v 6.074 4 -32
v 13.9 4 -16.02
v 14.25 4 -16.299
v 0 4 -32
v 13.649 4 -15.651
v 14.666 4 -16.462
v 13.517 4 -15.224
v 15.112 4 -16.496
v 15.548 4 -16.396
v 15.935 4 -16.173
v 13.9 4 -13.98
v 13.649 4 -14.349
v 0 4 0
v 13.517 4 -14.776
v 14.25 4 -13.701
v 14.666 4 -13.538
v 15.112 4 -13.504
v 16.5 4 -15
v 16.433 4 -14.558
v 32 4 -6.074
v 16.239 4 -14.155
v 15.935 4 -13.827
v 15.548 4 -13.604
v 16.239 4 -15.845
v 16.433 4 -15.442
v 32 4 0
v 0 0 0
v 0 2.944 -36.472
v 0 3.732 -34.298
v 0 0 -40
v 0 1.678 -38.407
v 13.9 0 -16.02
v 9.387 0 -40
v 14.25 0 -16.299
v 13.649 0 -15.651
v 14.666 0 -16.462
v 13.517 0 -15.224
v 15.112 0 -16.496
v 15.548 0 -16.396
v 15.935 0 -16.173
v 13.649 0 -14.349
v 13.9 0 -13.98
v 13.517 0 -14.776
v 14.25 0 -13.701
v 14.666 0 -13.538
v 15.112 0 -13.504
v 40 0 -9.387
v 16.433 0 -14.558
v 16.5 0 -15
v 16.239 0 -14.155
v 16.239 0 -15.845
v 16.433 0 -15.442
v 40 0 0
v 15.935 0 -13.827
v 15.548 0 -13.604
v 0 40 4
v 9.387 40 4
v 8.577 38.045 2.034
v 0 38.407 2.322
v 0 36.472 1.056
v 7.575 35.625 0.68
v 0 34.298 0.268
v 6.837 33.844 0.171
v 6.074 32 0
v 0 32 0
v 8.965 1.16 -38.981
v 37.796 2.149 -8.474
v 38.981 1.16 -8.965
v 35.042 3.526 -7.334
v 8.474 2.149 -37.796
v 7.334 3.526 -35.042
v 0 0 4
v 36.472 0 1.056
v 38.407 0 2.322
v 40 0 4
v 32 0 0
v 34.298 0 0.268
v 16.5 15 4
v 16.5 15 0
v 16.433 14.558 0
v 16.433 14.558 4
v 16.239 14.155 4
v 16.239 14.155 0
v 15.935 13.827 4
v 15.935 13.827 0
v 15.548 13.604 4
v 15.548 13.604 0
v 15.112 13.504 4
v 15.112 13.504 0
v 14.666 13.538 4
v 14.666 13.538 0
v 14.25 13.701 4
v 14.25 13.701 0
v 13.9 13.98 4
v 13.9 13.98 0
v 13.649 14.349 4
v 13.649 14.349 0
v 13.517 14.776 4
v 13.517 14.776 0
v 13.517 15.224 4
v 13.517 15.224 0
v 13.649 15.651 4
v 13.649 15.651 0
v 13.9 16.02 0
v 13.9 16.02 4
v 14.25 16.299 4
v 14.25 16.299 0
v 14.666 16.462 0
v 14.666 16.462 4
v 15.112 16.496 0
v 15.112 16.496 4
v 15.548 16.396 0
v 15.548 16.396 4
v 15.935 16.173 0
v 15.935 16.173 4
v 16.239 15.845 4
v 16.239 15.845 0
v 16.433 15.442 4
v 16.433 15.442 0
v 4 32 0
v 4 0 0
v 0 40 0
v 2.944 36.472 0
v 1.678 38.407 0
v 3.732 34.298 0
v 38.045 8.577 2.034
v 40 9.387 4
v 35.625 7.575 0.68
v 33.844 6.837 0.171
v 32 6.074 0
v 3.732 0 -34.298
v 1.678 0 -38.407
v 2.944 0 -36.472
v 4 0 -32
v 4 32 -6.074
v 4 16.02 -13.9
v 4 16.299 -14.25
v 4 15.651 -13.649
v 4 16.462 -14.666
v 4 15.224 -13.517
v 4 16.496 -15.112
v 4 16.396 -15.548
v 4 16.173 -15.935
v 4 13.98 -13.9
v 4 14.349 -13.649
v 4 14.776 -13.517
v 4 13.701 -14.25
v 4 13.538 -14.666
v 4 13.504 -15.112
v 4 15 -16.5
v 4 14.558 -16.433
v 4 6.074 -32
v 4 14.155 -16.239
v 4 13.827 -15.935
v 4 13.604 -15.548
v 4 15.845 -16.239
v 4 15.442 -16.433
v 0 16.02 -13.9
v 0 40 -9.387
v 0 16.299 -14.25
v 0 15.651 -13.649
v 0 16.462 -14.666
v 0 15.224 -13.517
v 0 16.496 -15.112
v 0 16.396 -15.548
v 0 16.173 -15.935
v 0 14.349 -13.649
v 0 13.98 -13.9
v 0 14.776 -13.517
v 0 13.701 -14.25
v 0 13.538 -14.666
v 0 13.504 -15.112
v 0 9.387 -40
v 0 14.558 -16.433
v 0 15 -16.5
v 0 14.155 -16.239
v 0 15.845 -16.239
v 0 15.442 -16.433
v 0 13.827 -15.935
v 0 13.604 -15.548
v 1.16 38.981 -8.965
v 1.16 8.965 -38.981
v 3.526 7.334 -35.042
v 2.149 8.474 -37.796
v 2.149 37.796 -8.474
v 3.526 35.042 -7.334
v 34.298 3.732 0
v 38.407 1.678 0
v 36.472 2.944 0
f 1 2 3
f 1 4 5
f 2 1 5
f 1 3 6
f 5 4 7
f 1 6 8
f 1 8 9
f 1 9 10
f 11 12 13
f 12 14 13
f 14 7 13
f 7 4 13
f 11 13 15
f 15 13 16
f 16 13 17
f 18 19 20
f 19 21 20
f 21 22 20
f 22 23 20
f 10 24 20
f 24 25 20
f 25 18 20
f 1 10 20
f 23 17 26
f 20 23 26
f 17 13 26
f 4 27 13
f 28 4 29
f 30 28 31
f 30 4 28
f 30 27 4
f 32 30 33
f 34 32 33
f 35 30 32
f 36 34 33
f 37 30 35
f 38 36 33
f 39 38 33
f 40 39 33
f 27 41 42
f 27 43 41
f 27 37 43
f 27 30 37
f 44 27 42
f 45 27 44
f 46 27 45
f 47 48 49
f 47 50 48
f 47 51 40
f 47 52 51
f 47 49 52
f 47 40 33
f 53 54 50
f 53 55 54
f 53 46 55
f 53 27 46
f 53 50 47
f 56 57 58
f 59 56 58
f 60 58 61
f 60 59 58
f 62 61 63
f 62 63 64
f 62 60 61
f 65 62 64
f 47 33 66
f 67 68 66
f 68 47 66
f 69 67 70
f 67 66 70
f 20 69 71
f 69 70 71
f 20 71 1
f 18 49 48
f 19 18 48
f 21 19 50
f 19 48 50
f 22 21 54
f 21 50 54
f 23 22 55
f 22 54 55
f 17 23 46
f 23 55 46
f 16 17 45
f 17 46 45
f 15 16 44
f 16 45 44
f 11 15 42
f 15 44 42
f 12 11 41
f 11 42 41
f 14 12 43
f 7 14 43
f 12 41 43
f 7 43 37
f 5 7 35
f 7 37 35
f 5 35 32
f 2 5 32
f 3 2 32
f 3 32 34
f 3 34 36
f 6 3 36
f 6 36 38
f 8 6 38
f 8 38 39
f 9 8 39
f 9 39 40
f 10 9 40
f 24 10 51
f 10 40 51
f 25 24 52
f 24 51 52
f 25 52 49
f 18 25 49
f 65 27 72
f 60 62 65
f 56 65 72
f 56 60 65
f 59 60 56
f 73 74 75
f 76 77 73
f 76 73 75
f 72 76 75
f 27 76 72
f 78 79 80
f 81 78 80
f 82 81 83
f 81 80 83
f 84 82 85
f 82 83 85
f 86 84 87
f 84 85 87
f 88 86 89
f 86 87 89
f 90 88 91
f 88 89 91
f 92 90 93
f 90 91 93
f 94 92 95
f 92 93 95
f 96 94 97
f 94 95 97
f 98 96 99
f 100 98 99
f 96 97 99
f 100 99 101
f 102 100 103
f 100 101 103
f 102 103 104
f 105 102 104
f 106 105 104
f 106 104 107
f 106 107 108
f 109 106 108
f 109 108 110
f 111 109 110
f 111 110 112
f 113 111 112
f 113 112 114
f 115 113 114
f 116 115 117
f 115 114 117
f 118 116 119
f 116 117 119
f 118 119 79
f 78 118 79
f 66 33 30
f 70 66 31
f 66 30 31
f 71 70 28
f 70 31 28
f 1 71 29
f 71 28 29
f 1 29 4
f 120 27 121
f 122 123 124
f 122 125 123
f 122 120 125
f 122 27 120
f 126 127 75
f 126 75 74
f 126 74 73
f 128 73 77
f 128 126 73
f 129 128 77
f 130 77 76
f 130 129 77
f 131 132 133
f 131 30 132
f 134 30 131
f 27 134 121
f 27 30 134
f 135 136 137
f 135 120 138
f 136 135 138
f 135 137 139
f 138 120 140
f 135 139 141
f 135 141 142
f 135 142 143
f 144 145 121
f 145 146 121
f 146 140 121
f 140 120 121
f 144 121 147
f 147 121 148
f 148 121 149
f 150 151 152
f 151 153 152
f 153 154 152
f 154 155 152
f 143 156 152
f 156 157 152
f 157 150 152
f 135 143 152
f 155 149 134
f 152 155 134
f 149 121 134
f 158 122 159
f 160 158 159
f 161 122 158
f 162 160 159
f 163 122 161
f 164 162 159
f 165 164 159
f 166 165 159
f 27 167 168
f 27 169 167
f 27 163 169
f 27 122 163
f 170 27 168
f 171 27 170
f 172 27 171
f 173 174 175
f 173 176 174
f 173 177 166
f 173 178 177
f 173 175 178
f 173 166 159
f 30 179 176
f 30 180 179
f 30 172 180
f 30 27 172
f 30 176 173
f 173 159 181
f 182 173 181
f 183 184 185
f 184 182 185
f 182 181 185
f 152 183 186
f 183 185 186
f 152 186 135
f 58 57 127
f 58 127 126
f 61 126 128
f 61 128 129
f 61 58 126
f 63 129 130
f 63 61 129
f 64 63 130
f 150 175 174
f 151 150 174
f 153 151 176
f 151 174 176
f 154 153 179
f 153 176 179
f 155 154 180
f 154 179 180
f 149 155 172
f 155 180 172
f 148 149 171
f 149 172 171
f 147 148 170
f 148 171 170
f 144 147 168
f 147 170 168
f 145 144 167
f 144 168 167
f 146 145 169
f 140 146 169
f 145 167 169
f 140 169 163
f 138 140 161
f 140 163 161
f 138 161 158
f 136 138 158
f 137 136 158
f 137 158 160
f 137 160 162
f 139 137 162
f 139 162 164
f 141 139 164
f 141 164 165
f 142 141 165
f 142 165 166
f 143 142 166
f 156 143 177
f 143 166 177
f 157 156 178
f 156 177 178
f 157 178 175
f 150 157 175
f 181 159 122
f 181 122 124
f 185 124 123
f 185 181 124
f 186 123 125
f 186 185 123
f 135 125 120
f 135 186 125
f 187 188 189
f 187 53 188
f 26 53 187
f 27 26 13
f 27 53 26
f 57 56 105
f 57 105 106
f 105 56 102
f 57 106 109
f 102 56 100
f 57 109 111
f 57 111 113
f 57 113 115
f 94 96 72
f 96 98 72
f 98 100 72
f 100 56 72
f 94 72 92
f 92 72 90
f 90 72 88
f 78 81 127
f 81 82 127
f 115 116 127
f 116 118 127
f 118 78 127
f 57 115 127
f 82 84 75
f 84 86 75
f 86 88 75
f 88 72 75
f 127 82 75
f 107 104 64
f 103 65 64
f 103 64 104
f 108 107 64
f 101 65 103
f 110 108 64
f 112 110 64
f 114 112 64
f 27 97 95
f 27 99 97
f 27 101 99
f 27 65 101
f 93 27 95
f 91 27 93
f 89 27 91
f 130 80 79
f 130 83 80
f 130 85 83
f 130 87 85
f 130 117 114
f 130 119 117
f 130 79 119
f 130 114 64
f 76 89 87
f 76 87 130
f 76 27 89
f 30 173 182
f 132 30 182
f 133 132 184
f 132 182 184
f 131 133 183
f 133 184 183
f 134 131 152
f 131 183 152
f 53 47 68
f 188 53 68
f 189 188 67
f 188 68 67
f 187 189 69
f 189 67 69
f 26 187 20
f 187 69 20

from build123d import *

# Parameters (mm, degrees)
F0_R          = 1.5
F1_DEPTH      = 4
F2_ANGLE      = 90
F3_ANGLE      = 90
F4_T1_DEPTH   = 83.2928317533
F4_T3_DEPTH   = 49.3873450905
F4_T5_DEPTH   = 49.3873450905
F4_2_T1_DEPTH = 83.2928317533
F4_2_T3_DEPTH = 49.3873450905
F4_2_T5_DEPTH = 49.3873450905
F4_3_T1_DEPTH = 83.2928317533
F4_3_T3_DEPTH = 49.3873450905
F4_3_T5_DEPTH = 49.3873450905


# Not quite as in the source:
# - a fillet or chamfer that OpenCascade refuses, or shapes differently, is made with other operations: its cross-section is extruded or revolved along the edge and cut away or added


with BuildPart() as f1:
    # F0 (on Front) → F1 (new body)
    with BuildSketch(Plane.XZ):
        Polygon((40, 0), (0, 0), (0, -40), (9.3873450905, -40), (40, -9.3873450905), align=None)
        with Locations((15, -15)):
            Circle(F0_R, mode=Mode.SUBTRACT)
    extrude(amount=-F1_DEPTH)


with BuildPart() as f2_1:
    # F2: copy of F1
    add(f1.part.rotate(Axis((20, 0, 0), (1, 0, 0)), F2_ANGLE))


with BuildPart() as f3_1:
    # F3: copy of F2_1
    add(f2_1.part.rotate(Axis((0, 20, 0), (0, 1, 0)), F3_ANGLE))

    # F4#3: fillet of radius 10 on 3 edges, made by hand

    # F4_3_s2 → F4_3_t1 (cut)
    with BuildSketch(Plane(origin=(0, 29.4484630785, 29.4484630785), x_dir=(1, 0, 0), z_dir=(0, -0.7071067812, -0.7071067812))):
        with BuildLine():
            ThreePointArc((0, -34.9221266183), (2.94427191, -31.3942625733), (4, -26.9221266183))
            Line((4, -26.9221266183), (4, -34.9221266183))
            Line((4, -34.9221266183), (0, -34.9221266183))
        make_face()
    extrude(amount=F4_3_T1_DEPTH, mode=Mode.SUBTRACT)

    # F4_3_s4 → F4_3_t3 (cut)
    with BuildSketch(Plane.XZ.offset(-29.3873450905)):
        with BuildLine():
            ThreePointArc((0, -40), (2.94427191, -36.472135955), (4, -32))
            Line((4, -32), (4, -40))
            Line((4, -40), (0, -40))
        make_face()
    extrude(amount=F4_3_T3_DEPTH, mode=Mode.SUBTRACT)

    # F4_3_s6 → F4_3_t5 (cut)
    with BuildSketch(Plane.XY.offset(-29.3873450905)):
        with BuildLine():
            ThreePointArc((0, 40), (2.94427191, 36.472135955), (4, 32))
            Line((4, 32), (4, 40))
            Line((4, 40), (0, 40))
        make_face()
    extrude(amount=F4_3_T5_DEPTH, mode=Mode.SUBTRACT)


with BuildPart() as f1_1:
    add(f1.part)

    # F4: fillet of radius 10 on 3 edges, made by hand

    # F4_s2 → F4_t1 (cut)
    with BuildSketch(Plane(origin=(-29.4484630785, 0, -29.4484630785), x_dir=(0, 1, 0), z_dir=(0.7071067812, 0, 0.7071067812))):
        with BuildLine():
            ThreePointArc((0, -34.9221266183), (2.94427191, -31.3942625733), (4, -26.9221266183))
            Line((4, -26.9221266183), (4, -34.9221266183))
            Line((4, -34.9221266183), (0, -34.9221266183))
        make_face()
    extrude(amount=F4_T1_DEPTH, mode=Mode.SUBTRACT)

    # F4_s4 → F4_t3 (cut)
    with BuildSketch(Plane.YZ.offset(-20)):
        with BuildLine():
            ThreePointArc((0, -40), (2.94427191, -36.472135955), (4, -32))
            Line((4, -32), (4, -40))
            Line((4, -40), (0, -40))
        make_face()
    extrude(amount=F4_T3_DEPTH, mode=Mode.SUBTRACT)

    # F4_s6 → F4_t5 (cut)
    with BuildSketch(Plane.XY.offset(-29.3873450905)):
        with BuildLine():
            ThreePointArc((40, 0), (36.472135955, 2.94427191), (32, 4))
            Line((32, 4), (40, 4))
            Line((40, 4), (40, 0))
        make_face()
    extrude(amount=F4_T5_DEPTH, mode=Mode.SUBTRACT)


with BuildPart() as f2_1_1:
    add(f2_1.part)

    # F4#2: fillet of radius 10 on 3 edges, made by hand

    # F4_2_s2 → F4_2_t1 (cut)
    with BuildSketch(Plane(origin=(-29.4484630785, 29.4484630785, 0), x_dir=(0, 0, 1), z_dir=(0.7071067812, -0.7071067812, 0))):
        with BuildLine():
            ThreePointArc((4, -34.9221266183), (1.05572809, -31.3942625733), (0, -26.9221266183))
            Line((0, -26.9221266183), (0, -34.9221266183))
            Line((0, -34.9221266183), (4, -34.9221266183))
        make_face()
    extrude(amount=F4_2_T1_DEPTH, mode=Mode.SUBTRACT)

    # F4_2_s4 → F4_2_t3 (cut)
    with BuildSketch(Plane.YZ.offset(-20)):
        with BuildLine():
            ThreePointArc((40, 4), (36.472135955, 1.05572809), (32, 0))
            Line((32, 0), (40, 0))
            Line((40, 0), (40, 4))
        make_face()
    extrude(amount=F4_2_T3_DEPTH, mode=Mode.SUBTRACT)

    # F4_2_s6 → F4_2_t5 (cut)
    with BuildSketch(Plane.XZ.offset(-29.3873450905)):
        with BuildLine():
            ThreePointArc((40, 4), (36.472135955, 1.05572809), (32, 0))
            Line((32, 0), (40, 0))
            Line((40, 0), (40, 4))
        make_face()
    extrude(amount=F4_2_T5_DEPTH, mode=Mode.SUBTRACT)


solid = Compound([f3_1.part, f1_1.part, f2_1_1.part])
